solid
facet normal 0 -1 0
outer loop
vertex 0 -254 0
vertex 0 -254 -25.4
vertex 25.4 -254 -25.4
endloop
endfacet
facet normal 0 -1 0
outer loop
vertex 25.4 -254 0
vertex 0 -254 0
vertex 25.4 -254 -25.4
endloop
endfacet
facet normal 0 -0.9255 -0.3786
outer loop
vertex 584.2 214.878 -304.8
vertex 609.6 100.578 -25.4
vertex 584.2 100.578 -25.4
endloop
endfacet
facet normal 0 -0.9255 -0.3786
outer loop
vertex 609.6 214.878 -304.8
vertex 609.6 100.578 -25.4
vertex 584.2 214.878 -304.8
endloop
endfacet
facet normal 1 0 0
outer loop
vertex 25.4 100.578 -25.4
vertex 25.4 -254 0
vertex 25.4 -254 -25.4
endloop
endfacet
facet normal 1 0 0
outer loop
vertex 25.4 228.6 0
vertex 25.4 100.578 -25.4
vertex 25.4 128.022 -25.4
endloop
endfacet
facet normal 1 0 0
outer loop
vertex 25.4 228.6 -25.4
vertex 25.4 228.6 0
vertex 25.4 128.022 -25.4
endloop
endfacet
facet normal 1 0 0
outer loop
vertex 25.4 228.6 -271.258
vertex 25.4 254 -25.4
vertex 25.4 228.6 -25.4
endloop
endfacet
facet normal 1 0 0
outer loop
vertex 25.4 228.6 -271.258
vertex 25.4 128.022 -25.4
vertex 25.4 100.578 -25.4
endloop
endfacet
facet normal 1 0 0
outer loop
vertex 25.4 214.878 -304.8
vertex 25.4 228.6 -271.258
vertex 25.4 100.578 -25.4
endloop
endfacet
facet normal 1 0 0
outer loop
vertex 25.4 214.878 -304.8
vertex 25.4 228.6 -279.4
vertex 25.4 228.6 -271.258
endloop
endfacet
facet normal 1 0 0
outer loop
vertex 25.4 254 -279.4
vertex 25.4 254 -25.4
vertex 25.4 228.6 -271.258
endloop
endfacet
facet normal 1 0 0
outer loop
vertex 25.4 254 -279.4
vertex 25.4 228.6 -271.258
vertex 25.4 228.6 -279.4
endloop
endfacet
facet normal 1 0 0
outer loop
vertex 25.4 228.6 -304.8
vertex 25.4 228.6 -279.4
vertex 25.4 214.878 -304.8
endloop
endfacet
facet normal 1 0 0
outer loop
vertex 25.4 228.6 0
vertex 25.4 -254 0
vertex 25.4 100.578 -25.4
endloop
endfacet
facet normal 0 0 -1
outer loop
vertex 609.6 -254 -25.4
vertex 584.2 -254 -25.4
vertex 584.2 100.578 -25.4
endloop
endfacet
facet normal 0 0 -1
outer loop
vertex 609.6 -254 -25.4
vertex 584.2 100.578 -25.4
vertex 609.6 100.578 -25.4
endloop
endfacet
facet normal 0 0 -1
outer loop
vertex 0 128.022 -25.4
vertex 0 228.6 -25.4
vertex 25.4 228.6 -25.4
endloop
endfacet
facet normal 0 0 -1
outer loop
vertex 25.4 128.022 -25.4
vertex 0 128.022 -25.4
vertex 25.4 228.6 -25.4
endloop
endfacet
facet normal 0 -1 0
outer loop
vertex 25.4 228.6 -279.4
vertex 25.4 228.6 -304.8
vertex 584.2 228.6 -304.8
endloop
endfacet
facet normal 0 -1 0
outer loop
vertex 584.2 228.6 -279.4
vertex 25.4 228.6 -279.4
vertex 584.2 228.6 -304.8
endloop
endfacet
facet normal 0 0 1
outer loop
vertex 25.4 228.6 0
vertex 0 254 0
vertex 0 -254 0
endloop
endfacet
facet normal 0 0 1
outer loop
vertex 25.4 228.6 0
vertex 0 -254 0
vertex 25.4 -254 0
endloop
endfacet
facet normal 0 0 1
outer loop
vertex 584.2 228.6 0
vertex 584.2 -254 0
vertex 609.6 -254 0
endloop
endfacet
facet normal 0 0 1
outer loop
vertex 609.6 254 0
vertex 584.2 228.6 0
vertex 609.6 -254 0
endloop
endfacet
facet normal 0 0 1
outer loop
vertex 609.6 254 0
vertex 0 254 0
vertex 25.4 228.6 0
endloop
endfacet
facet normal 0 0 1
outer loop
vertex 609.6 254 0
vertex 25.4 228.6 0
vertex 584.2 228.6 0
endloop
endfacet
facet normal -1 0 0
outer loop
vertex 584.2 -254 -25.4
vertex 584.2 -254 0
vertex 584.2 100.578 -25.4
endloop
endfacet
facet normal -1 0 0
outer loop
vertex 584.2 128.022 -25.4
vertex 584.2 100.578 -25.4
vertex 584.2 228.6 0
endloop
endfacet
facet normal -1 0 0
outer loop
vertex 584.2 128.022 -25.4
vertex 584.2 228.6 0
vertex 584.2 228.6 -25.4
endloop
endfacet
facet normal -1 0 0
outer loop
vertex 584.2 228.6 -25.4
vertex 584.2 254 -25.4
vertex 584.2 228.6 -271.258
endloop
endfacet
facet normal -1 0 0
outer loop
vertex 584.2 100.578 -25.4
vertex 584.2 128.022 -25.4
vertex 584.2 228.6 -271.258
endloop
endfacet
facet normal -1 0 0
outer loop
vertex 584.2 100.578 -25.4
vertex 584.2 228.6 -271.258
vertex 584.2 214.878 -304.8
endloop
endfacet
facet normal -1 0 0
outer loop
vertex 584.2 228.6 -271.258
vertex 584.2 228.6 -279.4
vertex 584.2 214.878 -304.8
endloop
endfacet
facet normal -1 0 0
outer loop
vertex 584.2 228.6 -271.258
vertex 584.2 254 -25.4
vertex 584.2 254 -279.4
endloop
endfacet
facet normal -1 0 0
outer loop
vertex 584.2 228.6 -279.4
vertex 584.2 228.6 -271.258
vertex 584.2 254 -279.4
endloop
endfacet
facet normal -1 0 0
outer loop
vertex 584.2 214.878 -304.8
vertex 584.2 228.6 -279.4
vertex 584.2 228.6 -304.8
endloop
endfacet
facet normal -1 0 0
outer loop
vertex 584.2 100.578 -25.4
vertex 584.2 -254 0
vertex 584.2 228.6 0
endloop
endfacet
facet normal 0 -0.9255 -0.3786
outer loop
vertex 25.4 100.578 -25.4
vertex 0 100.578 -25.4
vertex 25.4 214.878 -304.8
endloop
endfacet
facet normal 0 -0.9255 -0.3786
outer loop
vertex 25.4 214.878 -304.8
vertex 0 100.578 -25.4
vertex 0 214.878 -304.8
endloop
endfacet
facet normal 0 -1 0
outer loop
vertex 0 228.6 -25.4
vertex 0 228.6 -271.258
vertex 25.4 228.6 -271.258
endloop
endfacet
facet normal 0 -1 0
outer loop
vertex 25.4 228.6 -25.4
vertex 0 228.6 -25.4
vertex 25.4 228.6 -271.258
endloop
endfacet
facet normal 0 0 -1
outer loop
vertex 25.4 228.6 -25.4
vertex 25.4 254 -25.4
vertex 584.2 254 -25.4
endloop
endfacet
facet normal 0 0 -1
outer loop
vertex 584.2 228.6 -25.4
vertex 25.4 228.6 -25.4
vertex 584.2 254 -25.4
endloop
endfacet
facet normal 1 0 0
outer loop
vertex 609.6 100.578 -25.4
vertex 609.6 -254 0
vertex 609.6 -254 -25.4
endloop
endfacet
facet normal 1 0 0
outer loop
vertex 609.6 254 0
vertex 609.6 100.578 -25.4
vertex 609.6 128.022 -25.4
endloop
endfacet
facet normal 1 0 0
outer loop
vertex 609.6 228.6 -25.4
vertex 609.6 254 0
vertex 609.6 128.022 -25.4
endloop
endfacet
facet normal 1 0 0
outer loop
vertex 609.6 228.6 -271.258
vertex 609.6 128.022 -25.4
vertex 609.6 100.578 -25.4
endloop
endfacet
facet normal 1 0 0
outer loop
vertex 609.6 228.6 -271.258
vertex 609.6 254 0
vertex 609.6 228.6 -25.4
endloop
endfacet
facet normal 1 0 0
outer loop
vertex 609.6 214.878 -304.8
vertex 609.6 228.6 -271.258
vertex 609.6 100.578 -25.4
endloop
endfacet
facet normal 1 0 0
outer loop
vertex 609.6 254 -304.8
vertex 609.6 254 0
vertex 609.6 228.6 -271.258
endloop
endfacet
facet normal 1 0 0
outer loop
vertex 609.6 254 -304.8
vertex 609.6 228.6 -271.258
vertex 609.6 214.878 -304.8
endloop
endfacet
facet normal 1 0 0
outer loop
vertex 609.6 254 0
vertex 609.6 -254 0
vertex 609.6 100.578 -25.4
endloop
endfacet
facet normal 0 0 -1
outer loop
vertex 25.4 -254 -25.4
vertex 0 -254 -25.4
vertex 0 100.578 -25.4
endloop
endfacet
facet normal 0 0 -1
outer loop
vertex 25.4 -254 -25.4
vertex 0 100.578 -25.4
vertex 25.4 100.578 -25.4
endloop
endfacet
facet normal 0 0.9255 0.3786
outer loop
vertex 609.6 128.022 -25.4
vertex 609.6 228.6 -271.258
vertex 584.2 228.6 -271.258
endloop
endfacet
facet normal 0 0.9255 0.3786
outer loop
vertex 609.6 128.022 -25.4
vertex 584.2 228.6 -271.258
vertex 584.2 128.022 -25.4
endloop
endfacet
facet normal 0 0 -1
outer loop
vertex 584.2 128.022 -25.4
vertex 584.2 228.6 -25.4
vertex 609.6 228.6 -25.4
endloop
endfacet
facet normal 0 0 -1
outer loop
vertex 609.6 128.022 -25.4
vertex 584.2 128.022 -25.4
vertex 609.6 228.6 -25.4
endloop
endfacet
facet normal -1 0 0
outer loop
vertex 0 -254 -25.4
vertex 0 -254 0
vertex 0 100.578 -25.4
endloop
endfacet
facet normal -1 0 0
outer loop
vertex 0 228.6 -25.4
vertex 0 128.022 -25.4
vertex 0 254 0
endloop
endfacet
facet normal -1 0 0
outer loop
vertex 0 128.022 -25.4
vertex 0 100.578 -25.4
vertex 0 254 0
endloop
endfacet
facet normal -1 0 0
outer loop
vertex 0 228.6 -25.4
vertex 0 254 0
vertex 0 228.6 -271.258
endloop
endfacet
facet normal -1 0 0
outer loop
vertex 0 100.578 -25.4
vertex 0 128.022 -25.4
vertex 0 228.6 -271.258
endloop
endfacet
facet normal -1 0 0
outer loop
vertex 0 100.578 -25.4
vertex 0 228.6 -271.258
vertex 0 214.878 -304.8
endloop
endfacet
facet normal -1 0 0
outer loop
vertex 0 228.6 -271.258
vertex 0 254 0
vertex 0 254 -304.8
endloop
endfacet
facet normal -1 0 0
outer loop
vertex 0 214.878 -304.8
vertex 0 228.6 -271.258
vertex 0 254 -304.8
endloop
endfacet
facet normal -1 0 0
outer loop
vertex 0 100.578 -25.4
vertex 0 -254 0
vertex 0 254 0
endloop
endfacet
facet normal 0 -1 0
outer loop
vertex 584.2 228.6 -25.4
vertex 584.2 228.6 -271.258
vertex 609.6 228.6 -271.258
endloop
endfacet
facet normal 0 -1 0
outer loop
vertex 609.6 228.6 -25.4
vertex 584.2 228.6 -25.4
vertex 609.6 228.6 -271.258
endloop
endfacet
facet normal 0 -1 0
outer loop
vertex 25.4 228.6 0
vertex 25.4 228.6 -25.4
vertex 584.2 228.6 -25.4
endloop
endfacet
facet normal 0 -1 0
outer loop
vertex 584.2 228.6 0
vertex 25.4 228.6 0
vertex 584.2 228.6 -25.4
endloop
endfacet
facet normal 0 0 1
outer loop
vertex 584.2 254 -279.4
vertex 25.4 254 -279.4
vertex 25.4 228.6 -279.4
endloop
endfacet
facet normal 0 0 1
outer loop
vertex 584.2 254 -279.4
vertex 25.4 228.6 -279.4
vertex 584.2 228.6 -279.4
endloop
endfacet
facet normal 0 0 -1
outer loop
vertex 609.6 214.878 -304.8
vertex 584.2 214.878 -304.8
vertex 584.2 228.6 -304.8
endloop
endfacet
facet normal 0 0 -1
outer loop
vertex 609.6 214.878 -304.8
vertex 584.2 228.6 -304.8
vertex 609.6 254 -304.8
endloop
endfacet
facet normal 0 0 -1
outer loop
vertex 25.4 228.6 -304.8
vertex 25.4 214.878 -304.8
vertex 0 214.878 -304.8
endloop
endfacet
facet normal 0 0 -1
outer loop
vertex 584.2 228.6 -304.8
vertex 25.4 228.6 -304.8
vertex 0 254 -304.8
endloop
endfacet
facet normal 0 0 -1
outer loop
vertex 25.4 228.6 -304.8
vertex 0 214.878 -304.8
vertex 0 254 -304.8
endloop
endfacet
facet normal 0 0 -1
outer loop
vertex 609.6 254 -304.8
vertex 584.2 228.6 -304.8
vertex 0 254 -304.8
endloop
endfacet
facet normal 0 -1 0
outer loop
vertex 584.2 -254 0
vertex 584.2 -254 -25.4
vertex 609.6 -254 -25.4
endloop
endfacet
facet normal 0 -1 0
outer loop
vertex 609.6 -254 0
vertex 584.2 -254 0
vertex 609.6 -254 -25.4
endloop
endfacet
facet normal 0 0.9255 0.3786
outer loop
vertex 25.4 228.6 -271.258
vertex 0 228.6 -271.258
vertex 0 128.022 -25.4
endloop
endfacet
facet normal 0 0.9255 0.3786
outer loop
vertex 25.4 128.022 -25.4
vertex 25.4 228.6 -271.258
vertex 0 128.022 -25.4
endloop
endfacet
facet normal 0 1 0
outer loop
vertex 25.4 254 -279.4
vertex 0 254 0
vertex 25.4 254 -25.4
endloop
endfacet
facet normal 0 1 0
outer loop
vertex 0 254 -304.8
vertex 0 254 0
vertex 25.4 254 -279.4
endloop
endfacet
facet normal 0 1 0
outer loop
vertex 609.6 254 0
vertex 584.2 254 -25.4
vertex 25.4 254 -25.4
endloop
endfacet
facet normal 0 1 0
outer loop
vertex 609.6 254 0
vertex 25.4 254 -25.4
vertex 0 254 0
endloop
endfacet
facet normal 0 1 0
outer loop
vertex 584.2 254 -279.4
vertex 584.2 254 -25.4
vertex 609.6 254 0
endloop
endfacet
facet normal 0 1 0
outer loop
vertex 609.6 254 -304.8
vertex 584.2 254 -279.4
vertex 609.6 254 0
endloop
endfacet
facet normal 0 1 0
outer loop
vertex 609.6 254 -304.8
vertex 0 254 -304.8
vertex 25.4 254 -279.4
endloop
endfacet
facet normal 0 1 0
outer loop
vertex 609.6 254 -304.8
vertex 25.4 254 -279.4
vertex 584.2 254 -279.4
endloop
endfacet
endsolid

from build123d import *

# Parameters (mm, degrees)
SKETCH1_W             = 25.4
SKETCH1_H             = 25.4
BOSS_EXTRUDE1_DEPTH   = 254
BOSS_EXTRUDE1_2_DEPTH = 254
SKETCH2_W             = 558.8
SKETCH2_H             = 25.4
BOSS_EXTRUDE2_DEPTH   = 25.4
BOSS_EXTRUDE3_DEPTH   = 25.4
BOSS_EXTRUDE4_DEPTH   = 25.4


with BuildPart() as part:
    # Sketch1 → Boss-Extrude1 (new, symmetric)
    with BuildSketch(Plane(origin=(0, 0, 0), x_dir=(1, 0, 0), z_dir=(0, 1, 0))):
        with Locations((12.7, 12.7)):
            Rectangle(SKETCH1_W, SKETCH1_H)
    extrude(amount=BOSS_EXTRUDE1_DEPTH, both=True)



with BuildPart() as body_2:
    # Sketch1 → Boss-Extrude1 2 (new, symmetric)
    with BuildSketch(Plane(origin=(0, 0, 0), x_dir=(1, 0, 0), z_dir=(0, 1, 0))):
        with Locations((596.9, 12.7)):
            Rectangle(SKETCH1_W, SKETCH1_H)
    extrude(amount=BOSS_EXTRUDE1_2_DEPTH, both=True)


with BuildPart() as part_1:
    add(part.part)

    add(body_2.part)  # Boss-Extrude2 merges body 2
    # Sketch2 → Boss-Extrude2 (add)
    with BuildSketch(Plane(origin=(0, 254, 0), x_dir=(1, 0, 0), z_dir=(0, 1, 0))):
        Polygon((0, 304.8), (0, 25.4), (25.4, 25.4), (25.4, 279.4), (584.2, 279.4), (584.2, 25.4), (609.6, 25.4), (609.6, 304.8), align=None)
        with Locations((304.8, 12.7)):
            Rectangle(SKETCH2_W, SKETCH2_H)
    extrude(amount=-BOSS_EXTRUDE2_DEPTH)

    # Sketch3 → Boss-Extrude3 (add)
    with BuildSketch(Plane(origin=(609.6, 0, 0), x_dir=(0, 0, -1), z_dir=(1, 0, 0))):
        Polygon((25.4, 128.021616083), (25.4, 100.578383917), (304.8, 214.878383917), (304.8, 228.6), (271.258271797, 228.6), align=None)
    extrude(amount=-BOSS_EXTRUDE3_DEPTH)

    # Sketch4 → Boss-Extrude4 (add)
    with BuildSketch(Plane.ZY):
        Polygon((-271.258271797, 228.6), (-25.4, 128.021616083), (-25.4, 100.578383917), (-304.8, 214.878383917), (-304.8, 228.6), align=None)
    extrude(amount=-BOSS_EXTRUDE4_DEPTH)


solid = part_1.part
